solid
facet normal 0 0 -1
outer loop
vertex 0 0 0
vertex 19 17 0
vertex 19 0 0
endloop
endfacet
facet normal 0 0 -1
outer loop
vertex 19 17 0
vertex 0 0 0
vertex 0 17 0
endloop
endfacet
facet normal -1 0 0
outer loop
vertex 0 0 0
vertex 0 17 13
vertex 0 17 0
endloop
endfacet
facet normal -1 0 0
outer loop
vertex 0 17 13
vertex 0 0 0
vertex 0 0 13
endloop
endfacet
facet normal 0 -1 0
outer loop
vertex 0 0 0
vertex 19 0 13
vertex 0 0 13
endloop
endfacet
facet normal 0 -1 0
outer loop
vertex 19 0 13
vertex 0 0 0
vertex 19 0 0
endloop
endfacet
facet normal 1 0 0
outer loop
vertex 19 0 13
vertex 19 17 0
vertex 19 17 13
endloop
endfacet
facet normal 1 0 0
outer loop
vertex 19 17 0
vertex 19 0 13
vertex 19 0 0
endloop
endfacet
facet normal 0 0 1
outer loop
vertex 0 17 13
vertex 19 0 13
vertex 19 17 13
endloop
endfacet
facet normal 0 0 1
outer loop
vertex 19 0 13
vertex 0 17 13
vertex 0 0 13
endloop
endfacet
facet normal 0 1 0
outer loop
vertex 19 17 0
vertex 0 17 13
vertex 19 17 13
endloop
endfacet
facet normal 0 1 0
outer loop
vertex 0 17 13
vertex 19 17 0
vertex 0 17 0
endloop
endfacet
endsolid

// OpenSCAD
translate([2.5, 1.5, 1.0]) color([0.28339650386048865, 0.7552228545587315, 0.9087743252220071]) cube([5, 3, 2], center=true);
translate([2.5, 1.5, 1.0]) color([0.5954099154864194, 0.03545096569102746, 0.7922364716417103]) cube([5, 3, 2], center=true);
translate([2.5, 1.5, 1.0]) color([0.30560393283991993, 0.33989040641624346, 0.5301854376454147]) cube([5, 3, 2], center=true);
translate([2.5, 1.5, 1.0]) color([0.24904704757555507, 0.9199780878573697, 0.1635547583408129]) cube([5, 3, 2], center=true);
translate([2.5, 1.5, 1.0]) color([0.41483040050373277, 0.2896919495072058, 0.5198341022016146]) cube([5, 3, 2], center=true);
translate([2.5, 1.5, 1.0]) color([0.5739818030823766, 0.6271396891048426, 0.5313758038379728]) cube([5, 3, 2], center=true);
translate([2.5, 1.5, 1.0]) color([0.4108045023355995, 0.634594012376466, 0.40341287658681757]) cube([5, 3, 2], center=true);
translate([3.5, 2.5, 1.5]) color([0.7785502590540477, 0.7881774252549901, 0.29225416811082217]) cube([7, 5, 3], center=true);
translate([3.5, 2.5, 1.5]) color([0.37180432355577453, 0.6288109059468862, 0.15706996711565713]) cube([7, 5, 3], center=true);
translate([3.5, 2.5, 1.5]) color([0.6970319309869248, 0.3814277529807131, 0.591062474757007]) cube([7, 5, 3], center=true);
translate([3.5, 2.5, 1.5]) color([0.1395330992312218, 0.6682583860975598, 0.3540578606136997]) cube([7, 5, 3], center=true);
translate([3.5, 2.5, 1.5]) color([0.4726655762072315, 0.4151074008495357, 0.47671524799509457]) cube([7, 5, 3], center=true);
translate([3.5, 2.5, 1.5]) color([0.6946956329164442, 0.31824017683207795, 0.6520544808985483]) cube([7, 5, 3], center=true);
translate([3.5, 2.5, 1.5]) color([0.060222107499701916, 0.3001851524622099, 0.7452096901500458]) cube([7, 5, 3], center=true);
translate([3.5, 2.5, 1.5]) color([0.05240587806206365, 0.6211421952822352, 0.025546799267838538]) cube([7, 5, 3], center=true);
translate([3.5, 2.5, 1.5]) color([0.4715288683099005, 0.8885450437134765, 0.010110093997603875]) cube([7, 5, 3], center=true);
translate([3.5, 2.5, 1.5]) color([0.5268280206539229, 0.06645682965886301, 0.8671097761494883]) cube([7, 5, 3], center=true);
translate([3.5, 2.5, 1.5]) color([0.6862965222396646, 0.7419538566814291, 0.669007579945888]) cube([7, 5, 3], center=true);
translate([5.5, 3.5, 2.5]) color([0.006423453698145676, 0.041177862257898545, 0.6208768040220466]) cube([11, 7, 5], center=true);
translate([5.5, 3.5, 2.5]) color([0.9996851255769114, 0.8731472390917929, 0.699685806725371]) cube([11, 7, 5], center=true);
translate([5.5, 3.5, 2.5]) color([0.7270999543422898, 0.2266870226016624, 0.751613934135812]) cube([11, 7, 5], center=true);
translate([5.5, 3.5, 2.5]) color([0.28792410486343756, 0.10546026702239297, 0.4608948954667579]) cube([11, 7, 5], center=true);
translate([5.5, 3.5, 2.5]) color([0.33019577252961807, 0.168255398651179, 0.42170989251140467]) cube([11, 7, 5], center=true);
translate([5.5, 3.5, 2.5]) color([0.8972009769638755, 0.4352702732981688, 0.4472918952497248]) cube([11, 7, 5], center=true);
translate([5.5, 3.5, 2.5]) color([0.708827757444238, 0.5241618701522923, 0.12922303534199353]) cube([11, 7, 5], center=true);
translate([5.5, 3.5, 2.5]) color([0.91039239754397, 0.4441243361619651, 0.7893377392253591]) cube([11, 7, 5], center=true);
translate([5.5, 3.5, 2.5]) color([0.38887513002224416, 0.806846018820692, 0.3895364160074527]) cube([11, 7, 5], center=true);
translate([5.5, 3.5, 2.5]) color([0.2201595216660458, 0.19619466691666865, 0.9400346443375104]) cube([11, 7, 5], center=true);
translate([5.5, 3.5, 2.5]) color([0.58653025858102, 0.04979326505826487, 0.38834759617804915]) cube([11, 7, 5], center=true);
translate([5.5, 3.5, 2.5]) color([0.234029260524927, 0.08465706460929934, 0.18675586852140846]) cube([11, 7, 5], center=true);
translate([5.5, 3.5, 2.5]) color([0.05699047999950346, 0.6380736282281027, 0.17337386483746886]) cube([11, 7, 5], center=true);
translate([6.5, 5.5, 3.5]) color([0.6107798762435255, 0.6125067478912297, 0.7049237107399368]) cube([13, 11, 7], center=true);
translate([6.5, 5.5, 3.5]) color([0.5121186506114312, 0.28442399033479826, 0.8774574539285279]) cube([13, 11, 7], center=true);
translate([6.5, 5.5, 3.5]) color([0.35307108172351365, 0.4582943249787391, 0.6318794317305464]) cube([13, 11, 7], center=true);
translate([6.5, 5.5, 3.5]) color([0.5161242981674495, 0.9564683485665337, 0.9547176774381221]) cube([13, 11, 7], center=true);
translate([6.5, 5.5, 3.5]) color([0.9297598506094263, 0.9340763496652581, 0.580960135568696]) cube([13, 11, 7], center=true);
translate([6.5, 5.5, 3.5]) color([0.49020206373000297, 0.7041168173823689, 0.21541959298546798]) cube([13, 11, 7], center=true);
translate([6.5, 5.5, 3.5]) color([0.26587203921552827, 0.04380725363309168, 0.16285754255803098]) cube([13, 11, 7], center=true);
translate([6.5, 5.5, 3.5]) color([0.0038745499388105342, 0.6546275765234981, 0.14040698903568194]) cube([13, 11, 7], center=true);
translate([6.5, 5.5, 3.5]) color([0.7866793455760521, 0.680503995881725, 0.9706757933544957]) cube([13, 11, 7], center=true);
translate([6.5, 5.5, 3.5]) color([0.3965144869518913, 0.9213919134510528, 0.4537041723195332]) cube([13, 11, 7], center=true);
translate([6.5, 5.5, 3.5]) color([0.3395037398362071, 0.10233886991705377, 0.8828321850718597]) cube([13, 11, 7], center=true);
translate([6.5, 5.5, 3.5]) color([0.7947901585625868, 0.3229289765350606, 0.45574438492562896]) cube([13, 11, 7], center=true);
translate([6.5, 5.5, 3.5]) color([0.32514346581324827, 0.028829116538094723, 0.04435252539911694]) cube([13, 11, 7], center=true);
translate([6.5, 5.5, 3.5]) color([0.3687041258820589, 0.20959132812878367, 0.5245146032105923]) cube([13, 11, 7], center=true);
translate([6.5, 5.5, 3.5]) color([0.1877850356496189, 0.2016215864664097, 0.6726678813176303]) cube([13, 11, 7], center=true);
translate([6.5, 5.5, 3.5]) color([0.7356026567617159, 0.31223209587410494, 0.8599943994333726]) cube([13, 11, 7], center=true);
translate([6.5, 5.5, 3.5]) color([0.2546391746557106, 0.34394037628155716, 0.712480390369609]) cube([13, 11, 7], center=true);
translate([8.5, 6.5, 5.5]) color([0.04450290132920964, 0.934183460116191, 0.07233773178762537]) cube([17, 13, 11], center=true);
translate([8.5, 6.5, 5.5]) color([0.4609310589380602, 0.7246048259600892, 0.04746853498479808]) cube([17, 13, 11], center=true);
translate([8.5, 6.5, 5.5]) color([0.8090026856371774, 0.9788933433114139, 0.460511672795628]) cube([17, 13, 11], center=true);
translate([8.5, 6.5, 5.5]) color([0.11812363628756806, 0.08147699565547994, 0.09873043616313526]) cube([17, 13, 11], center=true);
translate([8.5, 6.5, 5.5]) color([0.7654413741364753, 0.4140128484685186, 0.9192341581990311]) cube([17, 13, 11], center=true);
translate([8.5, 6.5, 5.5]) color([0.4406397760864845, 0.07714331014460807, 0.42693558751800065]) cube([17, 13, 11], center=true);
translate([8.5, 6.5, 5.5]) color([0.7548278934255565, 0.8293384268467949, 0.039351686529191854]) cube([17, 13, 11], center=true);
translate([8.5, 6.5, 5.5]) color([0.1803893912563338, 0.490013452023644, 0.12808547795160863]) cube([17, 13, 11], center=true);
translate([8.5, 6.5, 5.5]) color([0.8710926419421733, 0.9344608884461488, 0.3195969983538176]) cube([17, 13, 11], center=true);
translate([8.5, 6.5, 5.5]) color([0.43484368255202, 0.5570540644200566, 0.2855057910835891]) cube([17, 13, 11], center=true);
translate([8.5, 6.5, 5.5]) color([0.5410756974595614, 0.2011850454737838, 0.2966412512769129]) cube([17, 13, 11], center=true);
translate([8.5, 6.5, 5.5]) color([0.44178363318767744, 0.604669902191143, 0.5361650260862432]) cube([17, 13, 11], center=true);
translate([8.5, 6.5, 5.5]) color([0.2609879767339395, 0.23178787541805523, 0.11873023670071103]) cube([17, 13, 11], center=true);
translate([8.5, 6.5, 5.5]) color([0.7834936358921726, 0.09890076646638046, 0.7328850061793606]) cube([17, 13, 11], center=true);
translate([8.5, 6.5, 5.5]) color([0.2487736956630997, 0.28455698400578255, 0.7360834330107994]) cube([17, 13, 11], center=true);
translate([8.5, 6.5, 5.5]) color([0.6596207917216363, 0.7419215555155583, 0.5152830587943614]) cube([17, 13, 11], center=true);
translate([8.5, 6.5, 5.5]) color([0.8590958196652707, 0.12179389137547159, 0.6451969614065052]) cube([17, 13, 11], center=true);
translate([8.5, 6.5, 5.5]) color([0.11824431248865597, 0.7372833681454282, 0.3589046614584527]) cube([17, 13, 11], center=true);
translate([9.5, 8.5, 6.5]) color([0.67488210437111, 0.7034839134412817, 0.6606084576410584]) cube([19, 17, 13], center=true);
translate([9.5, 8.5, 6.5]) color([0.22155798032782648, 0.8317998863873537, 0.24013608742346748]) cube([19, 17, 13], center=true);
translate([9.5, 8.5, 6.5]) color([0.5181532972121122, 0.6746457541533513, 0.23360317478475656]) cube([19, 17, 13], center=true);
translate([9.5, 8.5, 6.5]) color([0.628511722983939, 0.2868310479973286, 0.1713823760843869]) cube([19, 17, 13], center=true);
translate([9.5, 8.5, 6.5]) color([0.809748828526577, 0.5531227700773604, 0.32788470660885605]) cube([19, 17, 13], center=true);
translate([9.5, 8.5, 6.5]) color([0.5854309472055399, 0.025286397427288332, 0.12982285676032723]) cube([19, 17, 13], center=true);
translate([9.5, 8.5, 6.5]) color([0.3955808516982431, 0.9757565794644123, 0.5104745178761232]) cube([19, 17, 13], center=true);
translate([9.5, 8.5, 6.5]) color([0.07645620506689521, 0.7650406152494567, 0.7814438709253152]) cube([19, 17, 13], center=true);
translate([9.5, 8.5, 6.5]) color([0.7748021743948562, 0.5694980380479538, 0.6956987378694627]) cube([19, 17, 13], center=true);
translate([9.5, 8.5, 6.5]) color([0.21345793631163135, 0.7325605908939883, 0.8161739873415944]) cube([19, 17, 13], center=true);
translate([9.5, 8.5, 6.5]) color([0.7599665402219192, 0.353462402585887, 0.5910280505757086]) cube([19, 17, 13], center=true);
translate([9.5, 8.5, 6.5]) color([0.6289893574898388, 0.9008098536570839, 0.1080138952733335]) cube([19, 17, 13], center=true);
translate([9.5, 8.5, 6.5]) color([0.8339337708504084, 0.5264355584690392, 0.3586141205519373]) cube([19, 17, 13], center=true);
translate([9.5, 8.5, 6.5]) color([0.4556029014937524, 0.012635498930738787, 0.22007359233142765]) cube([19, 17, 13], center=true);
translate([9.5, 8.5, 6.5]) color([0.6527634200680049, 0.660849279754449, 0.4946989402863131]) cube([19, 17, 13], center=true);
translate([9.5, 8.5, 6.5]) color([0.9533258805973196, 0.4809150885494712, 0.3139436595456605]) cube([19, 17, 13], center=true);
translate([9.5, 8.5, 6.5]) color([0.8477808391956414, 0.259158299397262, 0.6043059930343495]) cube([19, 17, 13], center=true);
translate([9.5, 8.5, 6.5]) color([0.7034188523223, 0.8216962986917842, 0.7853687501827489]) cube([19, 17, 13], center=true);
translate([9.5, 8.5, 6.5]) color([0.3840923305137113, 0.059180305962736934, 0.03828786548344276]) cube([19, 17, 13], center=true);
